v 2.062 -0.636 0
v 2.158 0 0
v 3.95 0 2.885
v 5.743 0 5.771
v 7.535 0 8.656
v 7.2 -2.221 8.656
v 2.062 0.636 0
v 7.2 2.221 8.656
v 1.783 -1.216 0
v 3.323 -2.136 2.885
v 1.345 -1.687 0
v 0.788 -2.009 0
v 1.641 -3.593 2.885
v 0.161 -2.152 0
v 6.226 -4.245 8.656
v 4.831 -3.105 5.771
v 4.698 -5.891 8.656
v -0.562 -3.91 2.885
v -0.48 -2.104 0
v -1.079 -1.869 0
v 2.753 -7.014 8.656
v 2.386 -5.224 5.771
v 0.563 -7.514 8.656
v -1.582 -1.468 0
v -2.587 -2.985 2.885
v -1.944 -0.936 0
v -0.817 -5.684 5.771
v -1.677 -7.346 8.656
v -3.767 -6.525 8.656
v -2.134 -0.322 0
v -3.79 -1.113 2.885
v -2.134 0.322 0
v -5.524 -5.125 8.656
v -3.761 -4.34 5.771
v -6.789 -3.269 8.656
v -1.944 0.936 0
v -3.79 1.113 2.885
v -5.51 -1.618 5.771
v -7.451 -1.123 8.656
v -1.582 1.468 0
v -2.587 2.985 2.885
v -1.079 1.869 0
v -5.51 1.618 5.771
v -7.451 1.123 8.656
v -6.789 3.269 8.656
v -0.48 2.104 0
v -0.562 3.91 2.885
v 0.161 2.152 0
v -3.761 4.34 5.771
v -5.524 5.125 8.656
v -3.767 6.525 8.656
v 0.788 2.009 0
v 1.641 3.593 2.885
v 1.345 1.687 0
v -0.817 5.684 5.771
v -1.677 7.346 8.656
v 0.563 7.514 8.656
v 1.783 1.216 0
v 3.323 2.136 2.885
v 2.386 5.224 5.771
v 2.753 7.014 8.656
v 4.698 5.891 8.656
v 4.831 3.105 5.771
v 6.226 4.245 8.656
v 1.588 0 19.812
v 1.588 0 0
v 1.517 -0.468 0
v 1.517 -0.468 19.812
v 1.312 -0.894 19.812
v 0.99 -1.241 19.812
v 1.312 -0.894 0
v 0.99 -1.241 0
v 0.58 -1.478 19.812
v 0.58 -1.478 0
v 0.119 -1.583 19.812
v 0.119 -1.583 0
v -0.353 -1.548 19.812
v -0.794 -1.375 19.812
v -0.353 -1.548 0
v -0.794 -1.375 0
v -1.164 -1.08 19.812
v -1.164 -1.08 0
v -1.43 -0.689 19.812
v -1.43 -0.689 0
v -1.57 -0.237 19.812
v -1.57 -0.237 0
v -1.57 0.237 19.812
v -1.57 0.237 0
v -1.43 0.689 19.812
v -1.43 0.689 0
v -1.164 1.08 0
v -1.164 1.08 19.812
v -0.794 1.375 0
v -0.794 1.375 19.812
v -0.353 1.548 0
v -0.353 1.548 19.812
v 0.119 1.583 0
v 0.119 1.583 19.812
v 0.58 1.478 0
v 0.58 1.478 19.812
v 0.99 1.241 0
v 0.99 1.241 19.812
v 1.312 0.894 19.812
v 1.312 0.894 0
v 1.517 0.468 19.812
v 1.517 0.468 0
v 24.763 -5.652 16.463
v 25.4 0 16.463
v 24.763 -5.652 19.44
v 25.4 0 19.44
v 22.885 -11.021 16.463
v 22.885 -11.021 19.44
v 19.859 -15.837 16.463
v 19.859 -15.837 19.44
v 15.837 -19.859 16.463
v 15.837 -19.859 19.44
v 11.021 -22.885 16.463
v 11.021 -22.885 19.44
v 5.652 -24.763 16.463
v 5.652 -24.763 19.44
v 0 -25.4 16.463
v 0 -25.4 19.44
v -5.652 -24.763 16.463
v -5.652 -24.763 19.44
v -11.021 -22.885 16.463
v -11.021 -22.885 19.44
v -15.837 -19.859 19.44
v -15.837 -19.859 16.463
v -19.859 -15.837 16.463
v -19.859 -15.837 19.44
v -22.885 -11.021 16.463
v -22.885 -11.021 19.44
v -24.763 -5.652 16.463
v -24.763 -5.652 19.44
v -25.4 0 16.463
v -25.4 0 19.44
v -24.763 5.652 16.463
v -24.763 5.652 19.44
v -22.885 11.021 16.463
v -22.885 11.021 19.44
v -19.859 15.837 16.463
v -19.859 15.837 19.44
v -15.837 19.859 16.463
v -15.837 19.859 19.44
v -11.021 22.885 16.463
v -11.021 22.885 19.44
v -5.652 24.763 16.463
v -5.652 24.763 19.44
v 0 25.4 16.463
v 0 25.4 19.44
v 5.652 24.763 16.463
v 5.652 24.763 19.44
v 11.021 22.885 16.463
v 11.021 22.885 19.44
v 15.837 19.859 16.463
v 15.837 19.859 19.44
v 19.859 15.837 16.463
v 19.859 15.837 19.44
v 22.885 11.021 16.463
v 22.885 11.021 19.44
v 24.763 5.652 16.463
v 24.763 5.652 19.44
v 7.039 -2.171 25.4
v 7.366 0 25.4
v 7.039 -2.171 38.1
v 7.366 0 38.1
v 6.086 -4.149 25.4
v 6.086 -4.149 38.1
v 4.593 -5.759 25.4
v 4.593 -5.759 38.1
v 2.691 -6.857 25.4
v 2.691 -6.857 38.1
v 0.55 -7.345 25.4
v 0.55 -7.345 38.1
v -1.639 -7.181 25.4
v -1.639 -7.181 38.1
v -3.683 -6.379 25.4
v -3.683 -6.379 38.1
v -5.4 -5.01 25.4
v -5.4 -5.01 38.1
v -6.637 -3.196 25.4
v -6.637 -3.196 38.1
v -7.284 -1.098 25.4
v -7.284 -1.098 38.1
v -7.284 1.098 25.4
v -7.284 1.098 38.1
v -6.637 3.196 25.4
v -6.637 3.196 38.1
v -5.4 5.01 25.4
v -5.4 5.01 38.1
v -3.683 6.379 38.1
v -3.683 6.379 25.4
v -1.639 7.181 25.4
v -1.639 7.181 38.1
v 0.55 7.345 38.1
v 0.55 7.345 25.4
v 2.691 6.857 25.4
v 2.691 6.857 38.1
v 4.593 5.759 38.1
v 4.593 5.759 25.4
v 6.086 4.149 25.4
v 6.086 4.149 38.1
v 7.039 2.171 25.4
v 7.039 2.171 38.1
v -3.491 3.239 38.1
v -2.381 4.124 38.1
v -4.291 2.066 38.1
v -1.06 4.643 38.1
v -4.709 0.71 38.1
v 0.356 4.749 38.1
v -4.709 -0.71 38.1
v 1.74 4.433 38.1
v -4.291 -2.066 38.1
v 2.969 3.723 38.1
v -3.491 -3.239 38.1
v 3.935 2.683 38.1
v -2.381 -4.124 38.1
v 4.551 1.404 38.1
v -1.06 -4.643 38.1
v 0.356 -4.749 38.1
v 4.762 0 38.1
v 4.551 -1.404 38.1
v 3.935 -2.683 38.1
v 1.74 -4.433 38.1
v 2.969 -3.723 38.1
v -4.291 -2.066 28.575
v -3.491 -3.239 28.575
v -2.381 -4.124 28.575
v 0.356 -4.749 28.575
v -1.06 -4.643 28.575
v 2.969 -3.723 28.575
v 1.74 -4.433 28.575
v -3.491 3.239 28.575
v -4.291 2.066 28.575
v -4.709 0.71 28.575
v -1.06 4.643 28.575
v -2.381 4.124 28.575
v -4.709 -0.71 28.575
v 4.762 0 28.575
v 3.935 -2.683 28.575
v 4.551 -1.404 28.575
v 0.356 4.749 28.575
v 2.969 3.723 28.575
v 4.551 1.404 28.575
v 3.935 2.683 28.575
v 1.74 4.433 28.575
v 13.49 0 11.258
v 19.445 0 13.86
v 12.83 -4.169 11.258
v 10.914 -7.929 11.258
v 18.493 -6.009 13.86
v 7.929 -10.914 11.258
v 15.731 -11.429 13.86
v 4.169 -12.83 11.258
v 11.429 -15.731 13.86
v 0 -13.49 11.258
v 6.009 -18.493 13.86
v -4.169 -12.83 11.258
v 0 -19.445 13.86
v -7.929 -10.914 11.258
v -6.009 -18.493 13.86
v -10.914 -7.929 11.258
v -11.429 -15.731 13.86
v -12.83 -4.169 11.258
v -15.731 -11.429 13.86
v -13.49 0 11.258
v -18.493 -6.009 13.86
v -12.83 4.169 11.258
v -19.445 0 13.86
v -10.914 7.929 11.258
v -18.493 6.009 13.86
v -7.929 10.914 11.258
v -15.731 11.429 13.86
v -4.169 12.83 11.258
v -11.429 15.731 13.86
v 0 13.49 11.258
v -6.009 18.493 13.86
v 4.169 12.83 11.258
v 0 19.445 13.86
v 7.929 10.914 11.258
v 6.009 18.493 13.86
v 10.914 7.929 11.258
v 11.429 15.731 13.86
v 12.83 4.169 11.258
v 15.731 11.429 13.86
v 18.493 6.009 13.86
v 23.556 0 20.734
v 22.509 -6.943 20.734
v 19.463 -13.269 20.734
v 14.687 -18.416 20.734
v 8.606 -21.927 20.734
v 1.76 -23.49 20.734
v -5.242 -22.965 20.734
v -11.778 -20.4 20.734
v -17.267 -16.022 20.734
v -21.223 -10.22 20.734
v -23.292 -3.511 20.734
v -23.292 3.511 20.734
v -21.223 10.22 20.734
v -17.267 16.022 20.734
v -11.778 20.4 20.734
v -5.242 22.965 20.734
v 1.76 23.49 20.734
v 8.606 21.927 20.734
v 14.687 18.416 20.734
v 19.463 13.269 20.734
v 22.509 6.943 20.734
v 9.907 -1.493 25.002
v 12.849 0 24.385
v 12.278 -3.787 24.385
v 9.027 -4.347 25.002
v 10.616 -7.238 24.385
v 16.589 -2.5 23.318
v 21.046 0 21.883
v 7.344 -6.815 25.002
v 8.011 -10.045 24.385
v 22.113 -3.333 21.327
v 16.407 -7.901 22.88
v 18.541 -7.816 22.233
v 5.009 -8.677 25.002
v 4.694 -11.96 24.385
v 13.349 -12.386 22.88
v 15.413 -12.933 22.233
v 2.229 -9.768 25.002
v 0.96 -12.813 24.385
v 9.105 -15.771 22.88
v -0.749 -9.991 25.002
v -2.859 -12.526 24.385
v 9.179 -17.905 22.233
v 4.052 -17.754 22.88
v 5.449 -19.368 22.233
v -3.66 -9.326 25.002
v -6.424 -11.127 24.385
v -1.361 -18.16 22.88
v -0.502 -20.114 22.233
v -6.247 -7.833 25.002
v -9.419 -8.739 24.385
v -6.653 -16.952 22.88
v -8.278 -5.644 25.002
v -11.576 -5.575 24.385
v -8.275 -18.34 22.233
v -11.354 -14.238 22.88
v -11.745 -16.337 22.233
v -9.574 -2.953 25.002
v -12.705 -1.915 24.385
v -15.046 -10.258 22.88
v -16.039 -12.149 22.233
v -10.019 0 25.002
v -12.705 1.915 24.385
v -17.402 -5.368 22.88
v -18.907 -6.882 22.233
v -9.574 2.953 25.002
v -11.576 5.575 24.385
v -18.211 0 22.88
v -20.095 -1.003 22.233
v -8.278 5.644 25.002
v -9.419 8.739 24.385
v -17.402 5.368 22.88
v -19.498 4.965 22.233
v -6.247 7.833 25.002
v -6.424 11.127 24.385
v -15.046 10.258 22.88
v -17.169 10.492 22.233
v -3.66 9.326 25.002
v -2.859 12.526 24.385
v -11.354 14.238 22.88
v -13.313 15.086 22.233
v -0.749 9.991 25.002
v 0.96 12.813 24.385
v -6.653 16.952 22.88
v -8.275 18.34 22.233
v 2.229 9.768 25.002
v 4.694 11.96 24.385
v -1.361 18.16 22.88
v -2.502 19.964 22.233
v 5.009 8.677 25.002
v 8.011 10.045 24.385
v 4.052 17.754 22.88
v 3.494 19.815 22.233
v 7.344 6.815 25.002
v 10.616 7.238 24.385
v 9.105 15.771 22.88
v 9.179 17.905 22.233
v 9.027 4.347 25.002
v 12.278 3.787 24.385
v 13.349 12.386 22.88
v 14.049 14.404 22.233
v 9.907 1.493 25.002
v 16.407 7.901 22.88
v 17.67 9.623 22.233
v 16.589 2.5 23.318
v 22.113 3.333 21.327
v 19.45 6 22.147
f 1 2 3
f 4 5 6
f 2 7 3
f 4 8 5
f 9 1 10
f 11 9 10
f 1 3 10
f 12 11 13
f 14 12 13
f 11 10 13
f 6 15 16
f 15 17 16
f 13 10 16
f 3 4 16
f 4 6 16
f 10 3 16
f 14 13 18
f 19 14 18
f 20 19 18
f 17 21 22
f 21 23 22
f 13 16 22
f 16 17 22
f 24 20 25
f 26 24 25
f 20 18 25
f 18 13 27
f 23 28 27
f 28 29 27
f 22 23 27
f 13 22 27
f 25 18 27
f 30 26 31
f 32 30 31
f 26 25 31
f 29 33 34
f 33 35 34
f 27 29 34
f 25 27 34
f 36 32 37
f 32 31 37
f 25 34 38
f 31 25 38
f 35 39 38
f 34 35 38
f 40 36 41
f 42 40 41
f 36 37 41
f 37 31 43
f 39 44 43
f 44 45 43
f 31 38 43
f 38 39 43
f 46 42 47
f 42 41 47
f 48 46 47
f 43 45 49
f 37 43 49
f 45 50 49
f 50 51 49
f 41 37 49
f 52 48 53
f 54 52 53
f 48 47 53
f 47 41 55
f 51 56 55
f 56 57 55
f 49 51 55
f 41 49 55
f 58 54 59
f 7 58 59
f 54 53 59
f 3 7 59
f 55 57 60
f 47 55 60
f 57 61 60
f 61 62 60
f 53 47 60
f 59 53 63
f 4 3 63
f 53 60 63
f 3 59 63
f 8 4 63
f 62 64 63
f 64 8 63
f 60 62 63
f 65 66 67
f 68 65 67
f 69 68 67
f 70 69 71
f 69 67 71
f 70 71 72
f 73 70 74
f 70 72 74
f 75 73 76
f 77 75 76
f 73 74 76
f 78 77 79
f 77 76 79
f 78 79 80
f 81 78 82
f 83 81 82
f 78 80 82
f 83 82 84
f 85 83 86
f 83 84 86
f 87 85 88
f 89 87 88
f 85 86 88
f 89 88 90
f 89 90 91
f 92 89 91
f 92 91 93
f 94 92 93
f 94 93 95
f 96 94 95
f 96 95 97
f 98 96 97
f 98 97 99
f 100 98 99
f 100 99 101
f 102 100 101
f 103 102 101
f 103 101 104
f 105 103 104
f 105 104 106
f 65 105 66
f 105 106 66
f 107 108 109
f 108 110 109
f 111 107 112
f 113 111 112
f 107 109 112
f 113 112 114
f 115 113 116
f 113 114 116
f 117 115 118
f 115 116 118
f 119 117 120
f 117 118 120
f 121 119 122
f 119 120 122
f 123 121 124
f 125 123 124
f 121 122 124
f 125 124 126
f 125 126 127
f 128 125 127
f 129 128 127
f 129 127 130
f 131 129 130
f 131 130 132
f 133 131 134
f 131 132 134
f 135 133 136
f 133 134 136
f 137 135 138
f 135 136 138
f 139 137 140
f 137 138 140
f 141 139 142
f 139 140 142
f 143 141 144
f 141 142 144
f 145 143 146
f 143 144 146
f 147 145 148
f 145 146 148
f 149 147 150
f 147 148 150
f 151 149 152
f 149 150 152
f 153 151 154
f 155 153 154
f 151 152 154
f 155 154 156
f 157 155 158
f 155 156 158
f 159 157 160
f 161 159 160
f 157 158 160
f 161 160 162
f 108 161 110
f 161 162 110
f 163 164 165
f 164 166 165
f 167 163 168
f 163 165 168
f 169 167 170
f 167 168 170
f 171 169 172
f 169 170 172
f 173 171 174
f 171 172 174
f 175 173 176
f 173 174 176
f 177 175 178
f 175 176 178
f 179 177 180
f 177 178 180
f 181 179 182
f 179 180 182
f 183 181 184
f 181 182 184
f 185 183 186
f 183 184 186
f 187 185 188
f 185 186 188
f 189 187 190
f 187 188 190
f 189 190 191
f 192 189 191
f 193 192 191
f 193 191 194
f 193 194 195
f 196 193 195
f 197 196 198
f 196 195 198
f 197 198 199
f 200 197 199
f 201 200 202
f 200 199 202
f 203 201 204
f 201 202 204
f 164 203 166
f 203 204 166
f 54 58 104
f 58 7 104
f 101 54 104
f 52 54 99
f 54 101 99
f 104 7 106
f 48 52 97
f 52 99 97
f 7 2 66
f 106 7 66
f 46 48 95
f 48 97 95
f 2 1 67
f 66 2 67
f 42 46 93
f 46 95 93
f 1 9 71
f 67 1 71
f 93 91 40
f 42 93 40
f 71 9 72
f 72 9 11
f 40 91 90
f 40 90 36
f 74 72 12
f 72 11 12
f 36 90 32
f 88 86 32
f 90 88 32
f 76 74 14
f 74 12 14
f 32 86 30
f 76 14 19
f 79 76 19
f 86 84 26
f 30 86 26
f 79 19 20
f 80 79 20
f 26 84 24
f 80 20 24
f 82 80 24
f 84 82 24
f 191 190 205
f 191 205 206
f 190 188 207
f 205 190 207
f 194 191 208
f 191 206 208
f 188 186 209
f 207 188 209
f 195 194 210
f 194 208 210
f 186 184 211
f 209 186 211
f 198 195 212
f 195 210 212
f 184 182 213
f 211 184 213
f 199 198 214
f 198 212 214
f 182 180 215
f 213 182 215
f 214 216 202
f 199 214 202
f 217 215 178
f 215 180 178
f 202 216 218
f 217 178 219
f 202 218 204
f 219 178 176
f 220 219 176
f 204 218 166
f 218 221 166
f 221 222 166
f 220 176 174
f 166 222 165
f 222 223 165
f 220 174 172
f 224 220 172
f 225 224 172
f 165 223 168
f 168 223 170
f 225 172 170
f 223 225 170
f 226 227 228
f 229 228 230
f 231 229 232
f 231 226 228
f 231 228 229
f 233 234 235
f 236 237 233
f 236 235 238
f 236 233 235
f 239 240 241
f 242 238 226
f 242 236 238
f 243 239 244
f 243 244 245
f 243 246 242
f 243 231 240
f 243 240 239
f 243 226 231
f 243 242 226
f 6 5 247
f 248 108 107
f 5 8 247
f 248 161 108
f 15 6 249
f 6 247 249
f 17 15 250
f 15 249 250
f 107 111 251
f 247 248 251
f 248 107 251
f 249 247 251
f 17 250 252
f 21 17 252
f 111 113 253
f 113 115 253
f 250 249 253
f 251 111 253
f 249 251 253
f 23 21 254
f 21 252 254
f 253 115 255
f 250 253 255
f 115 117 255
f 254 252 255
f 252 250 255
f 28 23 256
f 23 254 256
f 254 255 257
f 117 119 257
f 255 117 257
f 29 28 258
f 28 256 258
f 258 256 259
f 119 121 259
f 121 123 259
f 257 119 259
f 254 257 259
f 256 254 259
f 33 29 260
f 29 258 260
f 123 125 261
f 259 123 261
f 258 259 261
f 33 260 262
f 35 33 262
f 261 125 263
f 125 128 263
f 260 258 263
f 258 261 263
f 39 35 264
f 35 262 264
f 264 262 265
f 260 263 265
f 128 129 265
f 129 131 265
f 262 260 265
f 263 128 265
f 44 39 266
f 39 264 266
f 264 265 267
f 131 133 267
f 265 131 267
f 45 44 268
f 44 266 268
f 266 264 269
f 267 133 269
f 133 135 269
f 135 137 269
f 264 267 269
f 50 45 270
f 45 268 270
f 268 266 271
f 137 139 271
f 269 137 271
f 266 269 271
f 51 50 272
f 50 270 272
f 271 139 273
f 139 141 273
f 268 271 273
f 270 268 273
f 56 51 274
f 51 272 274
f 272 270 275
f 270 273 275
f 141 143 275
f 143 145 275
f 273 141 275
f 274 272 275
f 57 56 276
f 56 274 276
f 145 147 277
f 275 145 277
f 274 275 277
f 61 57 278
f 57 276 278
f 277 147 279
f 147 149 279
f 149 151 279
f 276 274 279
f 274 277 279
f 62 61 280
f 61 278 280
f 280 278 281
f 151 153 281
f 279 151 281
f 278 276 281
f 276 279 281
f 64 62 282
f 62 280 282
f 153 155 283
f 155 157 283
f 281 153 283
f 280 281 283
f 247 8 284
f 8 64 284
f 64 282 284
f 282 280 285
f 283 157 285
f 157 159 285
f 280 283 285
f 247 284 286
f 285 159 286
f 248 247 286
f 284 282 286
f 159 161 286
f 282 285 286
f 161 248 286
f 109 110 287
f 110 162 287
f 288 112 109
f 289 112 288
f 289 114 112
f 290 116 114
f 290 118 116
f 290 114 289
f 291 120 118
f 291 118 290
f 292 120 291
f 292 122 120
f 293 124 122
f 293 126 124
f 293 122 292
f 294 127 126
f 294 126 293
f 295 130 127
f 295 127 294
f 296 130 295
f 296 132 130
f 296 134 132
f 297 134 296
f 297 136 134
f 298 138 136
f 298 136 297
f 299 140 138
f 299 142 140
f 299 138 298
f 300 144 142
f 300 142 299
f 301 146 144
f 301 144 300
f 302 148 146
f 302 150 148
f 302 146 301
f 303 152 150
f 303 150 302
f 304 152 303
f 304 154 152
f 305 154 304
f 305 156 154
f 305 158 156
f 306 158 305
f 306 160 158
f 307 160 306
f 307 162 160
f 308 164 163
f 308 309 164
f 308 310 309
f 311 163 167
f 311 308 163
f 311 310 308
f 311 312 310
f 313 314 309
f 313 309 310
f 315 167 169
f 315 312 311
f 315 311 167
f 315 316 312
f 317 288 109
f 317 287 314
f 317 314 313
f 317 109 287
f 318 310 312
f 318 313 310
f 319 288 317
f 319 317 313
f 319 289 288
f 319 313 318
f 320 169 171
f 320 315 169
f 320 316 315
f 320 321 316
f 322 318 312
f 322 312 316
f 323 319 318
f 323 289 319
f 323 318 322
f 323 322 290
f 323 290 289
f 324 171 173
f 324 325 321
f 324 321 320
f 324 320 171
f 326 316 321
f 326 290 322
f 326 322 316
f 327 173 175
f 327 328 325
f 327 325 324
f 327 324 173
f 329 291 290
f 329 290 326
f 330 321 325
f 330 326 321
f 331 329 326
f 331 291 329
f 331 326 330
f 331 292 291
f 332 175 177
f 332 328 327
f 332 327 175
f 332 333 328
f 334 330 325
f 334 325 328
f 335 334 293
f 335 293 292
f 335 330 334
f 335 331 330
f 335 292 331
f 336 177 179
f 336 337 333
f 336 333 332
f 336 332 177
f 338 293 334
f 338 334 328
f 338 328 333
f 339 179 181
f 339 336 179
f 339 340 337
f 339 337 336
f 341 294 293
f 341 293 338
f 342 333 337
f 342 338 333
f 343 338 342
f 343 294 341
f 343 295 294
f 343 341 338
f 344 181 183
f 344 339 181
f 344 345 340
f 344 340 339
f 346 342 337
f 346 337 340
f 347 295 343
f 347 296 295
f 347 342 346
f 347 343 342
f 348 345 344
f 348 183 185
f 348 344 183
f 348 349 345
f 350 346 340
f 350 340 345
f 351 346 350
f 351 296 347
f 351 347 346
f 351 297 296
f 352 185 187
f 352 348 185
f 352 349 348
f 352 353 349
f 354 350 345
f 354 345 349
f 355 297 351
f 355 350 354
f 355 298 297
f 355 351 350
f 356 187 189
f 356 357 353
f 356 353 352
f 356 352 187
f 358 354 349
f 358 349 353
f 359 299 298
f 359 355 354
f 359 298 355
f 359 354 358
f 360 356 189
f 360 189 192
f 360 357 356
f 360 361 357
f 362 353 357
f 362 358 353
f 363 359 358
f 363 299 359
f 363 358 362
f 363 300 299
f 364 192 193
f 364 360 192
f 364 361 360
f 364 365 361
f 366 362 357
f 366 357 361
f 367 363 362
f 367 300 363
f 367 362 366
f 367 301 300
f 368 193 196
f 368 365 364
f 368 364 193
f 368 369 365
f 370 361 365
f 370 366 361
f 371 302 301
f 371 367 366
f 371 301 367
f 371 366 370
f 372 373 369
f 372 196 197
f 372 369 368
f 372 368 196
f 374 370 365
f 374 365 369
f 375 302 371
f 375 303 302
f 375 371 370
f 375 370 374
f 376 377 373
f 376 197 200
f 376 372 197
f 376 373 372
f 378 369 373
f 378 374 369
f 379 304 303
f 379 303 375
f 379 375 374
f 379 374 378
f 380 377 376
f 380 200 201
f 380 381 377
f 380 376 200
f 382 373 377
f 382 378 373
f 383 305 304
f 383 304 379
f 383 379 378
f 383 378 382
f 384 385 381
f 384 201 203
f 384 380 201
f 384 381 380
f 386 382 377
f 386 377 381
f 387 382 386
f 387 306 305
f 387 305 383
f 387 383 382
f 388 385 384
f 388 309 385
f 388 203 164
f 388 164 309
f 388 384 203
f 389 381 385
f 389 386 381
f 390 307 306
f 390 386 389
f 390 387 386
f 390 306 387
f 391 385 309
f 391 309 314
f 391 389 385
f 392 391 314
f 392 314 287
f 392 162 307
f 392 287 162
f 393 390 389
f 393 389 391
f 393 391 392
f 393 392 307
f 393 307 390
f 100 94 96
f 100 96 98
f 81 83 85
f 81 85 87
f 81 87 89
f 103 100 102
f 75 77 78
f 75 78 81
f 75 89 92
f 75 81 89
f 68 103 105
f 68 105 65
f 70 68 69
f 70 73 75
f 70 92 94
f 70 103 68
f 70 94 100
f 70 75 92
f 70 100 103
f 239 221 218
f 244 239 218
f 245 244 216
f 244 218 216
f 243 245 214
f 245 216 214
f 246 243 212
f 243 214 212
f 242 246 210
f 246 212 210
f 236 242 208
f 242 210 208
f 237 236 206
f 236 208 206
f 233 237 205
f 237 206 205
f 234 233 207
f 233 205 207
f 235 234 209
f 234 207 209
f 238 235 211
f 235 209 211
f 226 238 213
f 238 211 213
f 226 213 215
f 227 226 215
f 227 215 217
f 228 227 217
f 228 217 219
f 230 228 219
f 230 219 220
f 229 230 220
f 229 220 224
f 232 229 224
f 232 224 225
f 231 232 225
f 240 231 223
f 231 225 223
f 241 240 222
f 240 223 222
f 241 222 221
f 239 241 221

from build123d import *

# Parameters (mm, degrees)
F2_R     = 4.7625
F3_DEPTH = 9.525
F4_R     = 1.5875
F5_DEPTH = 19.812


with BuildPart() as f1:
    # F0 (on Front) → F1 (revolve)
    with BuildSketch(Plane.XZ):
        with BuildLine():
            add(Edge.make_bspline(
                [(7.366, 25.4), (9.8036438765, 25.126718384), (14.9576453354, 23.9940702967), (23.5182465885, 21.2743691277), (25.4, 19.4404423237)],
                knots=[0, 0, 0, 0, 0.4619708182, 1, 1, 1, 1], degree=3))
            Line((7.366, 25.4), (7.366, 38.1))
            Line((7.366, 38.1), (0, 38.1))
            Line((0, 38.1), (0, 0))
            Line((0, 0), (2.1578229498, 0))
            Line((2.1578229498, 0), (7.5349872932, 8.6558889598))
            Line((7.5349872932, 8.6558889598), (25.4, 16.4627786726))
            Line((25.4, 16.4627786726), (25.4, 19.4404423237))
        make_face()
    revolve(axis=Axis((0, 0, 19.05), (0, 0, -1)))

    # F2 (on face) → F3 (cut)
    with BuildSketch(Plane.XY.offset(38.1)):
        Circle(F2_R)
    extrude(amount=-F3_DEPTH, mode=Mode.SUBTRACT)

    # F4 (on face) → F5 (cut)
    with BuildSketch(Plane(origin=(0, 0, 0), x_dir=(1, 0, 0), z_dir=(0, 0, -1))):
        Circle(F4_R)
    extrude(amount=-F5_DEPTH, mode=Mode.SUBTRACT)


solid = f1.part
